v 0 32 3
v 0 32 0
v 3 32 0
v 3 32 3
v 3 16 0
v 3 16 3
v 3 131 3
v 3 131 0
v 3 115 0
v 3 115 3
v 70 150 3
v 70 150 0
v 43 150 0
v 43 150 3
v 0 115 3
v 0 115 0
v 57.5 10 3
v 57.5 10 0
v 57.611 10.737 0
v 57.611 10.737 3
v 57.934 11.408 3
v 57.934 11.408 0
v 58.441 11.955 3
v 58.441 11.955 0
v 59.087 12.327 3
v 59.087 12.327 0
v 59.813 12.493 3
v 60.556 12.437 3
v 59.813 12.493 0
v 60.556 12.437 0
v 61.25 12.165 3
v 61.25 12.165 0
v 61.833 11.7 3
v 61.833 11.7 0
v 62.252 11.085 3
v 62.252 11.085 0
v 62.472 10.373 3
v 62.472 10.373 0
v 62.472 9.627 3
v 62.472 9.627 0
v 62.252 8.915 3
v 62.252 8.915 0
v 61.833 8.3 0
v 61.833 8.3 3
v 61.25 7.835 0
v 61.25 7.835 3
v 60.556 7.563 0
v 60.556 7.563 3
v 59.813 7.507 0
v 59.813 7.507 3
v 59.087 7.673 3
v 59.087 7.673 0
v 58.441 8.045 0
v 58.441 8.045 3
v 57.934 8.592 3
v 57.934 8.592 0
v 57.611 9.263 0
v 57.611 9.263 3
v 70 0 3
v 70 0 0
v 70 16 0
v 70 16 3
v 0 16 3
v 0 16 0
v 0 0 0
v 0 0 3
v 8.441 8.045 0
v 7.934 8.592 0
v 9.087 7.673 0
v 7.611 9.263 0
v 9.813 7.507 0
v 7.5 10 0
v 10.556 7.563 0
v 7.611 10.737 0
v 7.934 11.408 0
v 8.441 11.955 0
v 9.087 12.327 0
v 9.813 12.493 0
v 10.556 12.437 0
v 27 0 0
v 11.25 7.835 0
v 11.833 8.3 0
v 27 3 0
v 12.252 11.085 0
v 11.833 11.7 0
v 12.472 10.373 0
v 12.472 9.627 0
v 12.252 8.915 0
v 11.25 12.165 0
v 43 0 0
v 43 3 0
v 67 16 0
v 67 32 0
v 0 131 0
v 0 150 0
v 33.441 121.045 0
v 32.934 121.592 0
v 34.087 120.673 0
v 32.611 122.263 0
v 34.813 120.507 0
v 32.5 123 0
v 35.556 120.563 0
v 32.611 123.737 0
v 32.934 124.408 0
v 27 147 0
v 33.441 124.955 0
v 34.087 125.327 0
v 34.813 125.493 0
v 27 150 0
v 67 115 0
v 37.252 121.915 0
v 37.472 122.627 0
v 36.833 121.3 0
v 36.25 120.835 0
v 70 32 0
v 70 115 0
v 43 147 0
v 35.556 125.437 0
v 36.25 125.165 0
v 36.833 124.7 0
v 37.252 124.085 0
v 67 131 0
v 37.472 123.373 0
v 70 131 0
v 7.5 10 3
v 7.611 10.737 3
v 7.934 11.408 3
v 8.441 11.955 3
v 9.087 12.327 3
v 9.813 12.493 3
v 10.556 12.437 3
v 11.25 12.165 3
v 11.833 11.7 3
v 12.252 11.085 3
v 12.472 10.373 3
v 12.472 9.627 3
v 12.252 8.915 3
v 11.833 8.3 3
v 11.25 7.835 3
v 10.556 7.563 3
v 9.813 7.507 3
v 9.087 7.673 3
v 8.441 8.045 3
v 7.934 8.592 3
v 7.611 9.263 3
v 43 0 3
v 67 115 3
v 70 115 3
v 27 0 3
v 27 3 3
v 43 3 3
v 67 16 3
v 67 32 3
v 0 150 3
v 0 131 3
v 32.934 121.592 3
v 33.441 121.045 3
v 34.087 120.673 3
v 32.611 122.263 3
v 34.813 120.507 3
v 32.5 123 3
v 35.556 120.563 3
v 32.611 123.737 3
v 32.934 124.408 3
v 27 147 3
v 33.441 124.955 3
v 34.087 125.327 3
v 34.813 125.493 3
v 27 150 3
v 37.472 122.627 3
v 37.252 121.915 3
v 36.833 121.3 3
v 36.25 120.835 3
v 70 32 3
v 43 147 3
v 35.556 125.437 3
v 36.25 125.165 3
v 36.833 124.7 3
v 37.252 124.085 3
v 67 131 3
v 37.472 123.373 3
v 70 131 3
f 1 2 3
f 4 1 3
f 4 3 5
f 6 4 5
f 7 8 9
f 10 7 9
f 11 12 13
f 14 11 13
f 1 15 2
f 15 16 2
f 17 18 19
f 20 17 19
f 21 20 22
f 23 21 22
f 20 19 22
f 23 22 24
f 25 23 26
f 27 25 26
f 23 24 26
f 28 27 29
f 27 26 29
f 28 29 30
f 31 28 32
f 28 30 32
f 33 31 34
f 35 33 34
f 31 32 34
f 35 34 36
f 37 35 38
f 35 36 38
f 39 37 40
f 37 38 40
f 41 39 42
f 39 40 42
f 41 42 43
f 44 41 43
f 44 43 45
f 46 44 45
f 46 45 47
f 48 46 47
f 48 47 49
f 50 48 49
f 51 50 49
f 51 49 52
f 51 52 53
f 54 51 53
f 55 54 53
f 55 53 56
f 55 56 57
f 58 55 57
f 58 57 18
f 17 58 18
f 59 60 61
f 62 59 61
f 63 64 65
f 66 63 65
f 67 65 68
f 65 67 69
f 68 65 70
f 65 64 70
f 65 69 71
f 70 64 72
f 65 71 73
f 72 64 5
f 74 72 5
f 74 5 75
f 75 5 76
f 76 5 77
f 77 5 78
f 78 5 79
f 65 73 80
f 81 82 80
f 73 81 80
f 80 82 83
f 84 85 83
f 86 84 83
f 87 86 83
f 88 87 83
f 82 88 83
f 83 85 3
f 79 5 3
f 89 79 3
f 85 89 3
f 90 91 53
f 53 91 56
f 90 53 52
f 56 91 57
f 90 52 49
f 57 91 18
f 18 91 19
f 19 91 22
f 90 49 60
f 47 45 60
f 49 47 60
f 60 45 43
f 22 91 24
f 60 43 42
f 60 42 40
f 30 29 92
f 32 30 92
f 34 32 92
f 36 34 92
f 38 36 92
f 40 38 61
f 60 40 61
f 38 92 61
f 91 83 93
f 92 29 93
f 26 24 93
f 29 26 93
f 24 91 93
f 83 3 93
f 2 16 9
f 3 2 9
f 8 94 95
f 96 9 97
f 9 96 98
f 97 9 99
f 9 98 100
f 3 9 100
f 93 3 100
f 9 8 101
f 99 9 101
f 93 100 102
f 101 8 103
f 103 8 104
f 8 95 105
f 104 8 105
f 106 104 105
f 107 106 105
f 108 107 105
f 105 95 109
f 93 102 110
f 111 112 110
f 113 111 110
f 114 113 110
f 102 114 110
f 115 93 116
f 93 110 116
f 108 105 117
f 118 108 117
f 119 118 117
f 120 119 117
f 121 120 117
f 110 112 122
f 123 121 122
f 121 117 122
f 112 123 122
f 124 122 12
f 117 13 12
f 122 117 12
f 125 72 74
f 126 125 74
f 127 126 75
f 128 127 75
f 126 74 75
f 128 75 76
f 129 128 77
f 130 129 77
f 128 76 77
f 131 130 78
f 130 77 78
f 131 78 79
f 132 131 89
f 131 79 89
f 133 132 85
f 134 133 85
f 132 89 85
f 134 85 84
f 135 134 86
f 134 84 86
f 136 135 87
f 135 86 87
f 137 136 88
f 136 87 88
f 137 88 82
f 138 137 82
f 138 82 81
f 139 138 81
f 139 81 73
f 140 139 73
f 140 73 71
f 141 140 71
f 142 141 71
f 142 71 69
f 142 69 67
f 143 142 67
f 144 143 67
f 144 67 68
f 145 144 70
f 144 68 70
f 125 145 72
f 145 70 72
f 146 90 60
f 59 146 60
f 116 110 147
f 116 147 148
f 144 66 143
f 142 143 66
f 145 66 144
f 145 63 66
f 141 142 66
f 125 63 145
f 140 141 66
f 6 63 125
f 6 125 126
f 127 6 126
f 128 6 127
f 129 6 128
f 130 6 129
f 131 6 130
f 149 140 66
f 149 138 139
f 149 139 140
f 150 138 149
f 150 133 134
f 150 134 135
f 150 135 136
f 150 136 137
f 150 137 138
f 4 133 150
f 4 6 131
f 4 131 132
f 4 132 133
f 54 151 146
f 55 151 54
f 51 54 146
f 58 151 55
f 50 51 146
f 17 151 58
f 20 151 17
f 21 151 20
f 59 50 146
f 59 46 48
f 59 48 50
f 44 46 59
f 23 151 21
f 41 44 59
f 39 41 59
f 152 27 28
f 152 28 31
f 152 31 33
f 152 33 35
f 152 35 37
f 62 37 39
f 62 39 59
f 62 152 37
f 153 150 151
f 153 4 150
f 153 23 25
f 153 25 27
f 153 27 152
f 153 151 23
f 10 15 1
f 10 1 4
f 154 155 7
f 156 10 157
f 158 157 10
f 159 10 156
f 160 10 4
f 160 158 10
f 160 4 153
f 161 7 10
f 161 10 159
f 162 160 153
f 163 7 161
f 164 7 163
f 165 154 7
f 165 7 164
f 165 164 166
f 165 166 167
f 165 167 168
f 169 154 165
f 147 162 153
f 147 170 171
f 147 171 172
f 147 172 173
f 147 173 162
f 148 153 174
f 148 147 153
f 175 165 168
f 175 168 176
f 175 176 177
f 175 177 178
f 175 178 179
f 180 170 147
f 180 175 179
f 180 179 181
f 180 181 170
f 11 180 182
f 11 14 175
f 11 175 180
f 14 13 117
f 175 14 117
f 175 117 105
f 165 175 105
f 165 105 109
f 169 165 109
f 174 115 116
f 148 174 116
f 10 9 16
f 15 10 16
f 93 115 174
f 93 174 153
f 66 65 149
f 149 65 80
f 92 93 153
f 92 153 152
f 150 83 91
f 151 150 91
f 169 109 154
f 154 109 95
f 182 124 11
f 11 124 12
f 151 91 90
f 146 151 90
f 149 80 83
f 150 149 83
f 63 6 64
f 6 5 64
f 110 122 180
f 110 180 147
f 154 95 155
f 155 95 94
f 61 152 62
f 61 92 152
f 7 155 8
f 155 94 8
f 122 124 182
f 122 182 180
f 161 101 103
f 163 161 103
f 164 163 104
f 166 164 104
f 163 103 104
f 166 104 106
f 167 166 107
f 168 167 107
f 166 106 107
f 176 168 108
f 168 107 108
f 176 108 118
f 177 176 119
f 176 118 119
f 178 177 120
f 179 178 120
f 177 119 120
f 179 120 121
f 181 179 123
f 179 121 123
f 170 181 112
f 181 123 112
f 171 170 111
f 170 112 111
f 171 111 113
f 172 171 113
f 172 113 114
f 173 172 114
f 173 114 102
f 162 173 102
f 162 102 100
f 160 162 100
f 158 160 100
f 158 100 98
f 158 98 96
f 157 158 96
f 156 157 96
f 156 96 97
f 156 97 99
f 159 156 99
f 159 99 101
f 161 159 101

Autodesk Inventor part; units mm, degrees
ref_plane "YZ Plane" through (0, 0, 0) normal (1, 0, 0) x (0, 1, 0)
ref_plane "XZ Plane" through (0, 0, 0) normal (0, 1, 0) x (-1, 0, 0)
ref_plane "XY Plane" through (0, 0, 0) normal (0, 0, 1) x (1, 0, 0)
sketch "Sketch1" plane through (0, 0, 0) normal (0, 0, 1) x (1, 0, 0)
  line L0 (0, 0) -> (70, 0)
  line L1 (70, 0) -> (70, 150)
  line L2 (0, 131) -> (3, 131)
  line L3 (3, 131) -> (3, 115)
  line L4 (3, 115) -> (0, 115)
  line L5 (0, 115) -> (0, 131)
  line L6 (0, 32) -> (3, 32)
  line L7 (3, 32) -> (3, 16)
  line L8 (3, 16) -> (0, 16)
  line L9 (0, 16) -> (0, 32)
  line L10 (70, 131) -> (67, 131)
  line L11 (67, 131) -> (67, 115)
  line L12 (67, 115) -> (70, 115)
  line L13 (70, 115) -> (70, 131)
  line L14 (70, 32) -> (67, 32)
  line L15 (67, 32) -> (67, 16)
  line L16 (67, 16) -> (70, 16)
  line L17 (70, 16) -> (70, 32)
  line L18 (43, 150) -> (43, 147)
  line L19 (43, 147) -> (27, 147)
  line L20 (27, 147) -> (27, 150)
  line L21 (70, 150) -> (43, 150)
  line L22 (27, 150) -> (0, 150)
  line L23 (0, 150) -> (0, 131)
  line L24 (0, 115) -> (0, 0)
  line L25 (43, 0) -> (27, 0)
  line L26 (27, 0) -> (27, 3)
  line L27 (27, 3) -> (43, 3)
  line L28 (43, 3) -> (43, 0)
  point P0 (1.5, 16)
  point P1 (70, 123)
  point P2 (67, 123)
  dimension "d1" = 70
  dimension "d2" = 16
  dimension "d3" = 16
  dimension "d4" = 16
  dimension "d9" = 16
  dimension "d12" = 19
  dimension "d13" = 150
  dimension "d15" = 3
  dimension "d16" = 3
  dimension "d17" = 3
extrude "Plate1" add sketch "Sketch1" along normal blind 3 contours L24 L8 L7 L6 L4 L3 L2 L23 L22 L20 L19 L18 L21 L1 L10 L11 L12 L14 L15 L16 L0 L28 L27 L26
sketch "Sketch2" plane through (0, 0, 0) normal (0, 0, -1) x (-1, 0, 0)
  circle A0 centre (-35, 123) radius 2.5
  circle A1 centre (-60, 10) radius 2.5
  circle A2 centre (-10, 10) radius 2.5
  line L0 (-43, 147) -> (-27, 147) projected
  line L1 (-67, 131) -> (-67, 115) projected
  line L2 (-3, 131) -> (-3, 115) projected
  line L3 (0, 16) -> (-3, 16) projected
  line L4 (0, 0) -> (-27, 0) projected
  line L5 (0, 16) -> (0, 0) projected
  line L6 (-70, 0) -> (-70, 16) projected
  point P0 (-1.5, 16)
  point P1 (0, 8)
  dimension "d18" = 24
  dimension "d19" = 32
  dimension "d20" = 32
  dimension "d21" = 5
  dimension "d23" = 5
  dimension "d24" = 10
  dimension "d25" = 10
  dimension "d26" = 10
extrude "Extrusion1" cut sketch "Sketch2" against normal through all
equation "\"d14\" = Thickness"
equation "\"BendRadius\" = Thickness"
equation "\"BendReliefWidth\" = Thickness"
equation "\"BendReliefDepth\" = 0.5 * Thickness"
equation "\"CornerReliefSize\" = 4 * Thickness"
equation "\"MinimumRemnant\" = 2 * Thickness"
equation "\"TransitionRadius\" = BendRadius"
equation "\"JacobiRadiusSize\" = BendRadius"
equation "\"GapSize\" = Thickness"
equation "\"Thickness\" = 3"
properties part number "bottom plate" material "Hardboard"
